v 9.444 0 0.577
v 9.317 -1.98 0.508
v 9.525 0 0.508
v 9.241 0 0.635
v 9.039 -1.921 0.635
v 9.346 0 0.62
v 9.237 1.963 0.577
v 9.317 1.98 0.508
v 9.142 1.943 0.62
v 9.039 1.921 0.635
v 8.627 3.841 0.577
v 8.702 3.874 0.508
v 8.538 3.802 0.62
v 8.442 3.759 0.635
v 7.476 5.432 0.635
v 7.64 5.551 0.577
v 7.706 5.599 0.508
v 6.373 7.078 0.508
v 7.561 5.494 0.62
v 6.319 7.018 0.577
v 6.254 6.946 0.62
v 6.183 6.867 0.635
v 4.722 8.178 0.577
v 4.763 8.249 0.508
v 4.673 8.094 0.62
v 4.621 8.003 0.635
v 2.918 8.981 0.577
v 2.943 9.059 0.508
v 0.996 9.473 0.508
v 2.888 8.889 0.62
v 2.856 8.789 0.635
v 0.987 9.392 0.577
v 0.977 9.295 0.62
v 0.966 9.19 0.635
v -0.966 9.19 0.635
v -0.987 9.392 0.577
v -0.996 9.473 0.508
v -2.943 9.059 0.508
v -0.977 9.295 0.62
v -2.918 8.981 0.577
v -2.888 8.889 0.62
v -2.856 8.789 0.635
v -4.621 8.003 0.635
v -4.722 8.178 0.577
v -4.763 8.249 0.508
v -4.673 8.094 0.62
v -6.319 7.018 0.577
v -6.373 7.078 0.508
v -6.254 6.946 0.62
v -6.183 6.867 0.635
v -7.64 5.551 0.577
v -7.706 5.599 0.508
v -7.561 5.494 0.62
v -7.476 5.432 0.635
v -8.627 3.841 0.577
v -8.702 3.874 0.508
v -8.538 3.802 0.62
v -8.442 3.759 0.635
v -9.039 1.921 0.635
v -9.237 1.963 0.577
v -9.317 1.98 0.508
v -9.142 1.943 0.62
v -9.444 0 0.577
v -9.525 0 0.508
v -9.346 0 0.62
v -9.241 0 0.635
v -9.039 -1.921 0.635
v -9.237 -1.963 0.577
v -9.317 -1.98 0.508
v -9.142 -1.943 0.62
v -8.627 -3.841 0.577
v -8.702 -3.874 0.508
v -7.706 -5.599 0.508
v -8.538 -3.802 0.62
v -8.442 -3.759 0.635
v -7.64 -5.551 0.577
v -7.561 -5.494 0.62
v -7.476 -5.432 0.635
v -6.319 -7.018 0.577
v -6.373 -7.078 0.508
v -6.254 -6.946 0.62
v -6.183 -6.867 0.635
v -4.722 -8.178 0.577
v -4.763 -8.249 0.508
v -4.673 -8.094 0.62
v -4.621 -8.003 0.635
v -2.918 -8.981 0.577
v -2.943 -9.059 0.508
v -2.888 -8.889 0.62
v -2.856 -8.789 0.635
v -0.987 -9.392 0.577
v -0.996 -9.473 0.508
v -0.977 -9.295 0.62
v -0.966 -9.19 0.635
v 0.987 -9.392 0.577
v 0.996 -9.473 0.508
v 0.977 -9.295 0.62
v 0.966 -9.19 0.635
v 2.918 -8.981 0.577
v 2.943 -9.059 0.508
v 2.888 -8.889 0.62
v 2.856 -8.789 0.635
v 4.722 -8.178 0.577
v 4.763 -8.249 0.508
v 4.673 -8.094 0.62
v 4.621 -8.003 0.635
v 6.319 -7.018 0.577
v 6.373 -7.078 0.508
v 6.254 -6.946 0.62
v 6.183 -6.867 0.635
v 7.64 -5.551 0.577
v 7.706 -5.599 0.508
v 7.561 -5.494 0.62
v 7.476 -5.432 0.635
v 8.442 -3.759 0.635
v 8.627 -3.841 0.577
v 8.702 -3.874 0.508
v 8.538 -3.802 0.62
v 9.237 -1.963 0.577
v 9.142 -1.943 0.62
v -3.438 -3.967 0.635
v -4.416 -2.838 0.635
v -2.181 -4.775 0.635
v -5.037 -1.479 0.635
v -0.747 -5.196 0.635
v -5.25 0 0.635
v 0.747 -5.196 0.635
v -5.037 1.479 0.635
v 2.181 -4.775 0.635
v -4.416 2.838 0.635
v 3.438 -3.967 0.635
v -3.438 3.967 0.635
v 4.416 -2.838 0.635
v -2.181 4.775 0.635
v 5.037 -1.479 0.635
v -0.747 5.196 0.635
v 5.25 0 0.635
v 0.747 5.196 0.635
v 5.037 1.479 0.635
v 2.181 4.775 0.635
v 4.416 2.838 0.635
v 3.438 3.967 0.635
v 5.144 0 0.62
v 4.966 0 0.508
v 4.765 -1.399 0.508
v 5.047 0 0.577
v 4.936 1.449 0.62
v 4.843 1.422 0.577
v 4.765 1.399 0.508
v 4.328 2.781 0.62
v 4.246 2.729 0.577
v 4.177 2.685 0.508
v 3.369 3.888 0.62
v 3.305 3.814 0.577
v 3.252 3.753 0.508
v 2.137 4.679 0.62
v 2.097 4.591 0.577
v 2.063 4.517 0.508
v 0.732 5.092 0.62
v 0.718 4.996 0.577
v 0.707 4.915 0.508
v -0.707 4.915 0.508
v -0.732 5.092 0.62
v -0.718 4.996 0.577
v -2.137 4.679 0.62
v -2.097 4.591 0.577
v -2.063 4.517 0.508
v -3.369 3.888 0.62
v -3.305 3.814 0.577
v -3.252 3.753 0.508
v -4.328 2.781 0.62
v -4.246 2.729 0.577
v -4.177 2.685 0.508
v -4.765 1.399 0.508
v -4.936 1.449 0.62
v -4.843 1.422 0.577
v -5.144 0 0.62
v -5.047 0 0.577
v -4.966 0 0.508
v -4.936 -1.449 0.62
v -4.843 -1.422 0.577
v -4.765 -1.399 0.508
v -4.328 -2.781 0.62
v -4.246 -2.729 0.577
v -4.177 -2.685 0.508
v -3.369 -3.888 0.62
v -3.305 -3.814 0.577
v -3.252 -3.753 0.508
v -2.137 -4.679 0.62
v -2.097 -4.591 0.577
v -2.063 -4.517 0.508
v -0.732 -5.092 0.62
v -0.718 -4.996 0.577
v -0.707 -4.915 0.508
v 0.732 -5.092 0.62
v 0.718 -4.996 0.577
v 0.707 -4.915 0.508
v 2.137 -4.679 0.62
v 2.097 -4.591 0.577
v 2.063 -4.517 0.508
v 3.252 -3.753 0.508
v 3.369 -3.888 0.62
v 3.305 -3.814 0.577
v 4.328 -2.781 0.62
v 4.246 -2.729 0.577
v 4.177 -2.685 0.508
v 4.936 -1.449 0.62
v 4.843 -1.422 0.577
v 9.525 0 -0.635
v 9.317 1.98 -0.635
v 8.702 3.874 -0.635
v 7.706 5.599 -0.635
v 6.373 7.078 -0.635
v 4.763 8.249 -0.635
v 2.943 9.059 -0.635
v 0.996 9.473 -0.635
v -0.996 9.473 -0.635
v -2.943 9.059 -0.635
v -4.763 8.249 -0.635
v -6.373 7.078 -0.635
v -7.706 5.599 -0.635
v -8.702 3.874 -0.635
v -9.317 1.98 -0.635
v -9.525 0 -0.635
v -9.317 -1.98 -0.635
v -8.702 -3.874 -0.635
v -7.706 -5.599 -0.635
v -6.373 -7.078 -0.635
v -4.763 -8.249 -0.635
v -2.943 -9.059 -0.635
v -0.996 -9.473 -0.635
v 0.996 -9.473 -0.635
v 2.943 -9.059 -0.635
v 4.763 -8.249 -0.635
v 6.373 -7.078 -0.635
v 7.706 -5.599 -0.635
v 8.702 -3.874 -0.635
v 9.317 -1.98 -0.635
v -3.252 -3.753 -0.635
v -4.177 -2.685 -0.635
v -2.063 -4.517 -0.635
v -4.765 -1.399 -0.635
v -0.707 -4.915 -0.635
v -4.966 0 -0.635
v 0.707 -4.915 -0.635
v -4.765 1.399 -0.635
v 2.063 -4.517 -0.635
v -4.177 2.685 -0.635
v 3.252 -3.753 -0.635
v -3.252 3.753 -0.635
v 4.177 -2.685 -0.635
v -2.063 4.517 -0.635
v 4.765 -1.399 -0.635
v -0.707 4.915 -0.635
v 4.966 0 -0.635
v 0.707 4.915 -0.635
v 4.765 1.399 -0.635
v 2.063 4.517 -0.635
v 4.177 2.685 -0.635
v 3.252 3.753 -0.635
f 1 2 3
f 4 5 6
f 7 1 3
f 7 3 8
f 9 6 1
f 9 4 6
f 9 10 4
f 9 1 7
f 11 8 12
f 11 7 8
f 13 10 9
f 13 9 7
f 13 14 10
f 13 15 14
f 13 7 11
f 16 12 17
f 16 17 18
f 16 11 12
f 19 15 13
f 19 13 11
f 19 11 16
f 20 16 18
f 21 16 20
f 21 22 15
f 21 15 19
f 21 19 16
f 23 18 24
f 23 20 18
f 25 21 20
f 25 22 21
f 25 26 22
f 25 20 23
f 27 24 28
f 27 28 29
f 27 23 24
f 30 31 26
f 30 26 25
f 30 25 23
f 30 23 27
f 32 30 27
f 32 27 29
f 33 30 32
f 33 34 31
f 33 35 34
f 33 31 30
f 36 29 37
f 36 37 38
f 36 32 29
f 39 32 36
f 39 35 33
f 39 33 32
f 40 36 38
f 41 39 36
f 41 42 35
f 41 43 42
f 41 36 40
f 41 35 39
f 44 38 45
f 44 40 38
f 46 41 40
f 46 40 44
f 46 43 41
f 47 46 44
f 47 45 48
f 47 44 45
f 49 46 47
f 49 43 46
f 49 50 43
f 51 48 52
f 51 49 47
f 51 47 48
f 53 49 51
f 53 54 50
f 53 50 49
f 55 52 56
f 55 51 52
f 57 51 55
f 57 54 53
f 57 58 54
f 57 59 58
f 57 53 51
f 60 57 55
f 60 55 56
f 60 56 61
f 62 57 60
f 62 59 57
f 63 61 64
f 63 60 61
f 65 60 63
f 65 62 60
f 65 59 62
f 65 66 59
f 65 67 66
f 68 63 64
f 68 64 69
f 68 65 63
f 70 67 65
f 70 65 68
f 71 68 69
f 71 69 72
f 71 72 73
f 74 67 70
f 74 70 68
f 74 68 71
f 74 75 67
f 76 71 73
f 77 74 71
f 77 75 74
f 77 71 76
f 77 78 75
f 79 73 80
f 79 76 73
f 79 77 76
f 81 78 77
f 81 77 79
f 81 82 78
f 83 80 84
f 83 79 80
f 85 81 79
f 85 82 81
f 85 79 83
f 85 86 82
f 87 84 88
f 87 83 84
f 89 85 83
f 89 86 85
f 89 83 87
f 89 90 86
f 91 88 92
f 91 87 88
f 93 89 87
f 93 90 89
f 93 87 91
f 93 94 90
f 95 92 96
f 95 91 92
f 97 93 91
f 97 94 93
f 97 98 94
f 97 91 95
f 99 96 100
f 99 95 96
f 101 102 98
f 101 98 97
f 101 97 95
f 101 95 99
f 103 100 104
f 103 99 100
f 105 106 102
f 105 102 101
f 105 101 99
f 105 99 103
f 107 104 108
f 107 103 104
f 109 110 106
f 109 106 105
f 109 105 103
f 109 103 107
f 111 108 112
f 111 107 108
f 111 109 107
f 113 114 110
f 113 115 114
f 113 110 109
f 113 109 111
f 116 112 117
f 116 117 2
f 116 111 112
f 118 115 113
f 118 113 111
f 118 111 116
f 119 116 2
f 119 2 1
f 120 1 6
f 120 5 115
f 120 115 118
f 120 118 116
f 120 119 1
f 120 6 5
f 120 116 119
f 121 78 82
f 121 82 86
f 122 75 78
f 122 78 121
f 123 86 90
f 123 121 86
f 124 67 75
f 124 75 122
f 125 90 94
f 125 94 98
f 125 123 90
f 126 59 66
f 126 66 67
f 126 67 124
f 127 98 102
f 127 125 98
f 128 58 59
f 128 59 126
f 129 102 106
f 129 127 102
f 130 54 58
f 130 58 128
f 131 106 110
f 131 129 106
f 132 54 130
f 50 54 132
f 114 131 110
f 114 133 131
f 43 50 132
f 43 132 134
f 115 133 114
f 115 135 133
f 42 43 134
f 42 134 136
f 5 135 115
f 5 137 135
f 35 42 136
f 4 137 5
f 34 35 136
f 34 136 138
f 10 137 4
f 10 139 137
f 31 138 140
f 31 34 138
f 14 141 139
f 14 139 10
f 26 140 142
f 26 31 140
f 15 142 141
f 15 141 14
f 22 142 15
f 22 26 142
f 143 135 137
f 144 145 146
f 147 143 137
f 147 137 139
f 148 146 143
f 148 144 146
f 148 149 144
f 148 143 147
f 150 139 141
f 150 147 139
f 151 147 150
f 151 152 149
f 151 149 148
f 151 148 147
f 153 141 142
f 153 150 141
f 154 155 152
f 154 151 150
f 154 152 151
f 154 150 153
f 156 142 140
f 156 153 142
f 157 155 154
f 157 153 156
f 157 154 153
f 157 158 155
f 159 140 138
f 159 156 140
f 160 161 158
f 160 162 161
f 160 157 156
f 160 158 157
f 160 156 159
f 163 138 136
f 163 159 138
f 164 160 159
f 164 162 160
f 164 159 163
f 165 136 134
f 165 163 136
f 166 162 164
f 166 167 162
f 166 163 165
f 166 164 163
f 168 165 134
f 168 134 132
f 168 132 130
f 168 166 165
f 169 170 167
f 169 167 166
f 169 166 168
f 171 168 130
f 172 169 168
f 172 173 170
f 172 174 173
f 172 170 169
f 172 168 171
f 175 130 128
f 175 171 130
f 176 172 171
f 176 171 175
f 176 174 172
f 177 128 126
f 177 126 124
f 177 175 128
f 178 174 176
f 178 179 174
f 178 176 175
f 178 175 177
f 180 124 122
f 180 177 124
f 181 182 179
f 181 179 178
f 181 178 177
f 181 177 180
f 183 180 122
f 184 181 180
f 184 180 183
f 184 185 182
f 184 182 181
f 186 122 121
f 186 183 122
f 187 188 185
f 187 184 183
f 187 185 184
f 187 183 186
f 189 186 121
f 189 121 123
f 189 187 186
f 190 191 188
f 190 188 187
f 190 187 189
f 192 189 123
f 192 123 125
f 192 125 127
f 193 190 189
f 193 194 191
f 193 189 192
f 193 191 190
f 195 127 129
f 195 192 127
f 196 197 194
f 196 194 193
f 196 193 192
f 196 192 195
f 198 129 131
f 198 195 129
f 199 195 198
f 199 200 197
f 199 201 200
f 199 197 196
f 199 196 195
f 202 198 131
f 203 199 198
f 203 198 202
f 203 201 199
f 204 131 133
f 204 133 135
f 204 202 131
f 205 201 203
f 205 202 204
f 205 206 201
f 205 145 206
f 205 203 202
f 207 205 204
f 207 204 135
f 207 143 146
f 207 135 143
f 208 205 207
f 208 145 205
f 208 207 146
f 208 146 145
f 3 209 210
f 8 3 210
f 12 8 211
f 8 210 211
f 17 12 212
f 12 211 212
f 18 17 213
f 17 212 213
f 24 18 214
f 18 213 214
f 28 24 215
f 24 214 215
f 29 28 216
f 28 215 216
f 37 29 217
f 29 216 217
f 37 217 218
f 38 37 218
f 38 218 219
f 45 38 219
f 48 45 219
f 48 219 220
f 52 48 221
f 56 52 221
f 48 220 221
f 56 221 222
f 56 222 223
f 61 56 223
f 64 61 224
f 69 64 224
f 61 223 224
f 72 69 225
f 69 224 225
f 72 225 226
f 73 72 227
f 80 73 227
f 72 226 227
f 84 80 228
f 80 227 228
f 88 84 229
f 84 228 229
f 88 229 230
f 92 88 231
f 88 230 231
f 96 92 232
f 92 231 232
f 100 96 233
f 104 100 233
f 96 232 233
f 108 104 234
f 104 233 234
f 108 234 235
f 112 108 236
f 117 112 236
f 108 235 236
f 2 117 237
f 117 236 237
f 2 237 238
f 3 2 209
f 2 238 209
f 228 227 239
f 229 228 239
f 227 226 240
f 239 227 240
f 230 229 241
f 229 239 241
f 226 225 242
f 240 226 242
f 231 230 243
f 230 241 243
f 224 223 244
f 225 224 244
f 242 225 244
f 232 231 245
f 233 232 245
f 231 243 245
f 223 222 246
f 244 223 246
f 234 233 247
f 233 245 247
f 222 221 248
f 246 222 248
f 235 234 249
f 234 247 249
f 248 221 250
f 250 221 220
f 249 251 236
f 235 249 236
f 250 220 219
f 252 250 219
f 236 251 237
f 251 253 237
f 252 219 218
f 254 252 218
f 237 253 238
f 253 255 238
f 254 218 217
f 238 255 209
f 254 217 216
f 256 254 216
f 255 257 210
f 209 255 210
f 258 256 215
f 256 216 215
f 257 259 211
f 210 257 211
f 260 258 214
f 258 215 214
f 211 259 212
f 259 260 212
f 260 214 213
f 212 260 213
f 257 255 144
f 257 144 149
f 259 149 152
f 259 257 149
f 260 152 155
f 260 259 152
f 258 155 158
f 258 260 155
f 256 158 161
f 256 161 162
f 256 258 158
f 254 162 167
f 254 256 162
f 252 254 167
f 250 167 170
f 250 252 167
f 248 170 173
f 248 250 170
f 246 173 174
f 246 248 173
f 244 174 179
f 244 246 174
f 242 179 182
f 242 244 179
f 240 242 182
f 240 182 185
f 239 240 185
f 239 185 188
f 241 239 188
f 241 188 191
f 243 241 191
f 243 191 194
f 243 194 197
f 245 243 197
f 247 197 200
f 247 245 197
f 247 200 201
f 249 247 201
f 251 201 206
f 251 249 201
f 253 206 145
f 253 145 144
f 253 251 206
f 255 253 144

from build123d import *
from OCP.BRepFilletAPI import BRepFilletAPI_MakeChamfer

# Parameters (mm, degrees)
BOSS_EXTRUDE1_START = -0.635
SKETCH3_R           = 9.525
SKETCH3_R_2         = 4.9657
BOSS_EXTRUDE1_DEPTH = 1.27
CHAMFER1_SIZE       = 0.127
CHAMFER1_SIZE2      = 0.073323484
FILLET1_R           = 0.381


with BuildPart() as part:
    # Sketch3 → Boss-Extrude1 (new body)
    with BuildSketch(Plane.XY.offset(BOSS_EXTRUDE1_START)):
        Circle(SKETCH3_R)
        Circle(SKETCH3_R_2, mode=Mode.SUBTRACT)
    extrude(amount=BOSS_EXTRUDE1_DEPTH)

    # Chamfer1: one chamfer whose edges measure the first distance from different faces: ONE call of the kernel's chamfer builder (chamfer() names one face for all edges)
    chamfer1_edges_1 = [part.edges().sort_by_distance(p)[0] for p in [
        (-9.525, 0, 0.635),
    ]]
    chamfer1_side_1 = [part.faces().sort_by_distance(p)[0] for p in [
        (-9.525, 0, 0),
    ]]
    chamfer1_edges_2 = [part.edges().sort_by_distance(p)[0] for p in [
        (-4.9657, 0, 0.635),
    ]]
    chamfer1_side_2 = [part.faces().sort_by_distance(p)[0] for p in [
        (-4.9657, 0, 0),
    ]]
    chamfer1 = BRepFilletAPI_MakeChamfer(part.part.solid().wrapped)
    for e in chamfer1_edges_1:
        chamfer1.Add(CHAMFER1_SIZE, CHAMFER1_SIZE2, e.wrapped, chamfer1_side_1[0].wrapped)  # the first distance lies on this face
    for e in chamfer1_edges_2:
        chamfer1.Add(CHAMFER1_SIZE, CHAMFER1_SIZE2, e.wrapped, chamfer1_side_2[0].wrapped)  # the first distance lies on this face
    add(Compound.cast(chamfer1.Shape()), mode=Mode.REPLACE)

    # Fillet1
    # the kernel refuses this fillet: 0.381 mm, written as the material it takes off along each edge
    with BuildSketch(Plane(origin=(0, 0, 0.635), x_dir=(1, 0, 0), z_dir=(0, -1, 0))) as fillet1_piece_1:
        with BuildLine():
            CenterArc((9.241019367, -0.381), FILLET1_R, 41.810314896, 48.189685104)
            Line((9.241019367, 0), (9.241019367, 0.00762))
            Line((9.241019367, 0.00762), (9.451676516, 0.00762))
            Line((9.451676516, 0.00762), (9.458275629, 0.00381))
            ThreePointArc((9.458275629, 0.00381), (9.494937371, -0.05969), (9.530679613, -0.12192))
            Line((9.530679613, -0.12192), (9.525, -0.127))
        make_face()
    revolve(axis=Axis((0, 0, 0.635), (0, 0, 1)), mode=Mode.SUBTRACT)
    with BuildSketch(Plane(origin=(0, 0, 0.635), x_dir=(1, 0, 0), z_dir=(0, -1, 0))) as fillet1_piece_2:
        with BuildLine():
            CenterArc((5.249680633, -0.381), FILLET1_R, 90, 48.189685104)
            Line((4.9657, -0.127), (4.960020387, -0.12192))
            ThreePointArc((4.960020387, -0.12192), (4.995762629, -0.05969), (5.032424371, 0.00381))
            Line((5.032424371, 0.00381), (5.039023484, 0.00762))
            Line((5.039023484, 0.00762), (5.249680633, 0.00762))
            Line((5.249680633, 0.00762), (5.249680633, 0))
        make_face()
    revolve(axis=Axis((0, 0, 0.635), (0, 0, 1)), mode=Mode.SUBTRACT)


solid = part.part
